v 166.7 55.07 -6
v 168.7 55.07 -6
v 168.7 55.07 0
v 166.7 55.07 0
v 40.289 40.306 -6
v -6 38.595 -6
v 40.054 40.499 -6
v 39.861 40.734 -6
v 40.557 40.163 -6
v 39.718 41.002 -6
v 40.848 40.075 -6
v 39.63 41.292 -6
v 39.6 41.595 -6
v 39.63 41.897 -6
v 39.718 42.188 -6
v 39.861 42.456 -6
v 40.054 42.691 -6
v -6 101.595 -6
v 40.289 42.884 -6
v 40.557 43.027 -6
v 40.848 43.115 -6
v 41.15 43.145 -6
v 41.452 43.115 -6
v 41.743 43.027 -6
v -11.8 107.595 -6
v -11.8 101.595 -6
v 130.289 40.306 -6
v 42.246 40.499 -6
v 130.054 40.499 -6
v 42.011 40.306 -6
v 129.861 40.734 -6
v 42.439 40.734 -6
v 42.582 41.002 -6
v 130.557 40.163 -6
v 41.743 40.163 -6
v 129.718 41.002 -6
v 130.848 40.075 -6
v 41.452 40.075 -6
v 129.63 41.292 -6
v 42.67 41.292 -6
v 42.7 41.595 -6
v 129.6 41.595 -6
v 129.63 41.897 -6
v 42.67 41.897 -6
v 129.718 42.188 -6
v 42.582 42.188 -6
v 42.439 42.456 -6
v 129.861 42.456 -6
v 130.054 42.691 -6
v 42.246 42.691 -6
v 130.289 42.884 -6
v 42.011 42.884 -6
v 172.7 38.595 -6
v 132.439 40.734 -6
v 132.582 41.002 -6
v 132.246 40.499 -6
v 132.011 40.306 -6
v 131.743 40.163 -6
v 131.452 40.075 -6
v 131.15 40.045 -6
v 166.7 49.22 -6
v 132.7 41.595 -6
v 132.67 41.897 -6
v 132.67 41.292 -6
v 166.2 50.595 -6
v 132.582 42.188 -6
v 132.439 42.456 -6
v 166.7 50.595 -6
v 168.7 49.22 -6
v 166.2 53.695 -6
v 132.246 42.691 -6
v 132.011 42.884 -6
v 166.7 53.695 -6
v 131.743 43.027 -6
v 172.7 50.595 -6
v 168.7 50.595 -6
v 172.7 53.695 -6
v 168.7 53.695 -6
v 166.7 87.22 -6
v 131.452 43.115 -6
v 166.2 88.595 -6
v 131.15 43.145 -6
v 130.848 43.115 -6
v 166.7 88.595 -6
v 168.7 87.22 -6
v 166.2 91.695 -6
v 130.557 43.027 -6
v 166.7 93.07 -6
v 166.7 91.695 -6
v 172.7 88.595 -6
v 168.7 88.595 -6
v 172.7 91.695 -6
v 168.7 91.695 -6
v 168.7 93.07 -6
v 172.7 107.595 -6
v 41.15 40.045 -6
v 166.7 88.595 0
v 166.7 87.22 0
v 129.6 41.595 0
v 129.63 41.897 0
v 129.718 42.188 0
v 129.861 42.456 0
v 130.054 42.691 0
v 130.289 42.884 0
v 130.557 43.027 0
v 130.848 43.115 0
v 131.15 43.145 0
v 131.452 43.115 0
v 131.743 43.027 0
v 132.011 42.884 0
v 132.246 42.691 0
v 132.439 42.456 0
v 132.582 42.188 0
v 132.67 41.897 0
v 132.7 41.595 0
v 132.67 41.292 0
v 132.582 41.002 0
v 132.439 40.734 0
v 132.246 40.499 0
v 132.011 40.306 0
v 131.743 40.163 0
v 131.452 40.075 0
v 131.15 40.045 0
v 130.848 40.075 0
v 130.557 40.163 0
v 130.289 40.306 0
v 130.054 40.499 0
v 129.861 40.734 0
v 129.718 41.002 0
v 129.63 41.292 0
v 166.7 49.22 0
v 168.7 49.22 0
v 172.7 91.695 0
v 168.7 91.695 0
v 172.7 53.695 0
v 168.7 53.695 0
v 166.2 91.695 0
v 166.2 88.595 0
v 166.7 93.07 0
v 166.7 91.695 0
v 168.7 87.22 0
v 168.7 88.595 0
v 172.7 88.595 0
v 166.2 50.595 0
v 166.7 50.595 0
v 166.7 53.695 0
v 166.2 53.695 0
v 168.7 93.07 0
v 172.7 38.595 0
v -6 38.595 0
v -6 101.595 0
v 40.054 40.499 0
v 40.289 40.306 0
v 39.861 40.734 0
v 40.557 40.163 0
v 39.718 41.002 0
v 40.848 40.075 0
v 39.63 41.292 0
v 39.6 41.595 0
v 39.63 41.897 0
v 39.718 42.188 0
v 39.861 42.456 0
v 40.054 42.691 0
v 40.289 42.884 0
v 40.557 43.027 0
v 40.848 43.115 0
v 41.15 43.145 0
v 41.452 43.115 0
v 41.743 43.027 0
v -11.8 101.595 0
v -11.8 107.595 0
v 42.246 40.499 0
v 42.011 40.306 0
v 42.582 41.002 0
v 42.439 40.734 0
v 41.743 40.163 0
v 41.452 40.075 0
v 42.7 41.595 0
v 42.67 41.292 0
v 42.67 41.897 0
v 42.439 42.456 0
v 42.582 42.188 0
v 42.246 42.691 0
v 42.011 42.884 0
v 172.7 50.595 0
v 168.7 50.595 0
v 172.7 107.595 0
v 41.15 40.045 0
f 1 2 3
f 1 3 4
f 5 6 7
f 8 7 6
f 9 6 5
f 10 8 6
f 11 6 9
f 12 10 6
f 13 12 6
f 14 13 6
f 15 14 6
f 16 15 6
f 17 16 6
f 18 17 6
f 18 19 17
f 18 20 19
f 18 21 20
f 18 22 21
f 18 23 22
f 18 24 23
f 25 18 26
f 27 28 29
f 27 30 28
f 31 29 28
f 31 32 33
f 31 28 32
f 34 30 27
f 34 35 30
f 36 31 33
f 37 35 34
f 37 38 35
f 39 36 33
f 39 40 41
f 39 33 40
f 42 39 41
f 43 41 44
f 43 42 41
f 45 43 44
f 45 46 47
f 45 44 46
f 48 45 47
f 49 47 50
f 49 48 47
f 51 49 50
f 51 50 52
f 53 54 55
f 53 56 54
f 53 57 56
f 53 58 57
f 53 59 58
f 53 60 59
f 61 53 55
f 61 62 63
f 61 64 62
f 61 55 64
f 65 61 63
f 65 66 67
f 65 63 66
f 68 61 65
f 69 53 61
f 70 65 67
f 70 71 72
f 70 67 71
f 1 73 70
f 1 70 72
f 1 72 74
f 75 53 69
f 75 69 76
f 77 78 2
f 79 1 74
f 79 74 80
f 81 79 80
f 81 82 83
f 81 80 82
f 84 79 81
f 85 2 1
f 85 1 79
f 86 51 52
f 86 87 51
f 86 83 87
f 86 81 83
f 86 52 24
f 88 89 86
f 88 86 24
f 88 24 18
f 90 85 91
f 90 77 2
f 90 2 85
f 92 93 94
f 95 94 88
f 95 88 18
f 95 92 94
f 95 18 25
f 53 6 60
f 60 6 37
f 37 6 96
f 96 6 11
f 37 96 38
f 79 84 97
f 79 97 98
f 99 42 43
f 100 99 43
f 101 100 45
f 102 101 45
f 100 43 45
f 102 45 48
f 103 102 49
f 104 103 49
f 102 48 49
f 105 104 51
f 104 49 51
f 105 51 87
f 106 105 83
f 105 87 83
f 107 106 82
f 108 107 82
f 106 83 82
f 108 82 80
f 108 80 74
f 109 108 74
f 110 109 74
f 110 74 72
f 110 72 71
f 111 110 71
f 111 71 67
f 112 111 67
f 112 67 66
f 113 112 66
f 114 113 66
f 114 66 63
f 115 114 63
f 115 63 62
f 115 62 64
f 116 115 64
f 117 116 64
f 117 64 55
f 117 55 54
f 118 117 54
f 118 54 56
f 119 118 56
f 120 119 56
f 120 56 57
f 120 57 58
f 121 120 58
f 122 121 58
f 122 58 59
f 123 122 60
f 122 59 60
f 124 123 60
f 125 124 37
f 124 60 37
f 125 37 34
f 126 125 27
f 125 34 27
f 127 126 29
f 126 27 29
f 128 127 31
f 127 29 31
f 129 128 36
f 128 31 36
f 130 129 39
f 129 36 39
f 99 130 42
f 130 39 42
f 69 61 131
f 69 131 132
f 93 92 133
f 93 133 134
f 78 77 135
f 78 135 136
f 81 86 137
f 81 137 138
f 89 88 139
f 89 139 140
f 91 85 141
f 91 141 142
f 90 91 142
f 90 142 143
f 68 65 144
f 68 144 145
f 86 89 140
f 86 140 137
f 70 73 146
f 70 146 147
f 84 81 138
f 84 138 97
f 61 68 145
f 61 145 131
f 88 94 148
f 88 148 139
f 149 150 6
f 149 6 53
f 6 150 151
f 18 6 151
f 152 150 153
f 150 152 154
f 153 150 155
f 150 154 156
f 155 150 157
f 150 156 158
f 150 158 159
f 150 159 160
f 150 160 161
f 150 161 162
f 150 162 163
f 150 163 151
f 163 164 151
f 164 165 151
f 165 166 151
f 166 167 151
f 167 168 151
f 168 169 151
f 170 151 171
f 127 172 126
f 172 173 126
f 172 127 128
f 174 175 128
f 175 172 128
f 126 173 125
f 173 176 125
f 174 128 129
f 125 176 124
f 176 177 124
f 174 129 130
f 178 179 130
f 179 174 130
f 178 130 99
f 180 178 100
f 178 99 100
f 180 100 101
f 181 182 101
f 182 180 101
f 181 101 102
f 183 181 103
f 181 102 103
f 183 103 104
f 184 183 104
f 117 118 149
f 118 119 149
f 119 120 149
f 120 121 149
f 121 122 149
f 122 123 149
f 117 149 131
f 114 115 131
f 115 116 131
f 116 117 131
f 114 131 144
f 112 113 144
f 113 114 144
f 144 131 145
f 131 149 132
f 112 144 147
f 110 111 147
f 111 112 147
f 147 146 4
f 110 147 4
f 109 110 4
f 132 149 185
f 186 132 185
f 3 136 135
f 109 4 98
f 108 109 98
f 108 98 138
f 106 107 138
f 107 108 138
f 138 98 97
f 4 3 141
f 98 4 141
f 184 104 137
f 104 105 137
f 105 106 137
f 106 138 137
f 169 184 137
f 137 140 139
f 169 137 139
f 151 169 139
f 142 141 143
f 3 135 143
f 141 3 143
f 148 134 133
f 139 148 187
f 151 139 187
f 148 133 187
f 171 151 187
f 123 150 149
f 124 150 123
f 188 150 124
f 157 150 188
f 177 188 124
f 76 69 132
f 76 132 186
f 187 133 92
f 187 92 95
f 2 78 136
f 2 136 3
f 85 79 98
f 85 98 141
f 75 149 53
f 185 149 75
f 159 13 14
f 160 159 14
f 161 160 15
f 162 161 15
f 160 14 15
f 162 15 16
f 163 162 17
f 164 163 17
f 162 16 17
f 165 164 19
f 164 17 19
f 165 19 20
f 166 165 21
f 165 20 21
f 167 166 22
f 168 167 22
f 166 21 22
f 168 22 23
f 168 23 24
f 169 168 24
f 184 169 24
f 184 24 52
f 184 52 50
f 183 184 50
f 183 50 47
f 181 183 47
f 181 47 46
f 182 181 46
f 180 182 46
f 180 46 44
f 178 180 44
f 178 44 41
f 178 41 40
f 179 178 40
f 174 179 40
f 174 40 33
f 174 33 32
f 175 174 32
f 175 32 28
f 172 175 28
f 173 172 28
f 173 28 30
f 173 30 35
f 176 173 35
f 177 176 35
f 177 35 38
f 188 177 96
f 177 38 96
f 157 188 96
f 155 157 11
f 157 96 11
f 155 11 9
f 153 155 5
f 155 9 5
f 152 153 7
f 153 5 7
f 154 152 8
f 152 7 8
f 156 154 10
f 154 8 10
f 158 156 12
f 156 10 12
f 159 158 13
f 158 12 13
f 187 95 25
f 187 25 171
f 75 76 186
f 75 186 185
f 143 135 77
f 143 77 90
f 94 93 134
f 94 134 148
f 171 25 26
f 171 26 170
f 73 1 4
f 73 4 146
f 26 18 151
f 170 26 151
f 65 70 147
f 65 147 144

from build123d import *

# Parameters (mm, degrees)
SZKIC1_W                    = 178.7
SZKIC1_H                    = 69
DODANIE_WYCI_GNI_CIE1_DEPTH = 6
SZKIC3_R                    = 1.55
WYTNIJ_WYCI_GNI_CIE1_DEPTH  = 204.563124249
WYTNIJ_WYCI_GNI_CIE2_DEPTH  = 204.563124249
SZYK_LINIOWY1_COUNT         = 2
SZYK_LINIOWY1_PITCH         = 38
SZKIC5_W                    = 6
SZKIC5_H                    = 6
DODANIE_WYCI_GNI_CIE2_DEPTH = 5.8


with BuildPart() as part:
    # Szkic1 → Dodanie-wyciągnięcie1 (new body)
    with BuildSketch(Plane.XY):
        with Locations((83.35, 73.094867693)):
            Rectangle(SZKIC1_W, SZKIC1_H)
    extrude(amount=-DODANIE_WYCI_GNI_CIE1_DEPTH)

    # Szkic3 → Wytnij-wyciągnięcie1 (cut, through all)
    with BuildSketch(Plane(origin=(0, 0, -6), x_dir=(-1, 0, 0), z_dir=(0, 0, -1))):
        with Locations((-41.15, 41.594867693)):
            Circle(SZKIC3_R)
        with Locations((-131.15, 41.594867693)):
            Circle(SZKIC3_R)
    extrude(amount=-WYTNIJ_WYCI_GNI_CIE1_DEPTH, mode=Mode.SUBTRACT)

    # Szkic4 → Wytnij-wyciągnięcie2 (cut, through all)
    with BuildSketch(Plane(origin=(0, 0, -6), x_dir=(-1, 0, 0), z_dir=(0, 0, -1))):
        Polygon((-172.7, 50.594867693), (-172.7, 53.694867693), (-168.7, 53.694867693), (-168.7, 55.069867693), (-166.7, 55.069867693), (-166.7, 53.694867693), (-166.2, 53.694867693), (-166.2, 50.594867693), (-166.7, 50.594867693), (-166.7, 49.219867693), (-168.7, 49.219867693), (-168.7, 50.594867693), align=None)
    wytnij_wyci_gni_cie2 = extrude(amount=-WYTNIJ_WYCI_GNI_CIE2_DEPTH, mode=Mode.SUBTRACT)

    # Szyk liniowy1: Wytnij-wyciągnięcie2 ×2
    with Locations(*[(0, i * SZYK_LINIOWY1_PITCH, 0) for i in range(1, SZYK_LINIOWY1_COUNT)]):
        add(wytnij_wyci_gni_cie2, mode=Mode.SUBTRACT)

    # Szkic5 → Dodanie-wyciągnięcie2 (add)
    with BuildSketch(Plane.ZY.offset(6)):
        with Locations((-3, 104.594867693)):
            Rectangle(SZKIC5_W, SZKIC5_H)
    extrude(amount=DODANIE_WYCI_GNI_CIE2_DEPTH)


solid = part.part
